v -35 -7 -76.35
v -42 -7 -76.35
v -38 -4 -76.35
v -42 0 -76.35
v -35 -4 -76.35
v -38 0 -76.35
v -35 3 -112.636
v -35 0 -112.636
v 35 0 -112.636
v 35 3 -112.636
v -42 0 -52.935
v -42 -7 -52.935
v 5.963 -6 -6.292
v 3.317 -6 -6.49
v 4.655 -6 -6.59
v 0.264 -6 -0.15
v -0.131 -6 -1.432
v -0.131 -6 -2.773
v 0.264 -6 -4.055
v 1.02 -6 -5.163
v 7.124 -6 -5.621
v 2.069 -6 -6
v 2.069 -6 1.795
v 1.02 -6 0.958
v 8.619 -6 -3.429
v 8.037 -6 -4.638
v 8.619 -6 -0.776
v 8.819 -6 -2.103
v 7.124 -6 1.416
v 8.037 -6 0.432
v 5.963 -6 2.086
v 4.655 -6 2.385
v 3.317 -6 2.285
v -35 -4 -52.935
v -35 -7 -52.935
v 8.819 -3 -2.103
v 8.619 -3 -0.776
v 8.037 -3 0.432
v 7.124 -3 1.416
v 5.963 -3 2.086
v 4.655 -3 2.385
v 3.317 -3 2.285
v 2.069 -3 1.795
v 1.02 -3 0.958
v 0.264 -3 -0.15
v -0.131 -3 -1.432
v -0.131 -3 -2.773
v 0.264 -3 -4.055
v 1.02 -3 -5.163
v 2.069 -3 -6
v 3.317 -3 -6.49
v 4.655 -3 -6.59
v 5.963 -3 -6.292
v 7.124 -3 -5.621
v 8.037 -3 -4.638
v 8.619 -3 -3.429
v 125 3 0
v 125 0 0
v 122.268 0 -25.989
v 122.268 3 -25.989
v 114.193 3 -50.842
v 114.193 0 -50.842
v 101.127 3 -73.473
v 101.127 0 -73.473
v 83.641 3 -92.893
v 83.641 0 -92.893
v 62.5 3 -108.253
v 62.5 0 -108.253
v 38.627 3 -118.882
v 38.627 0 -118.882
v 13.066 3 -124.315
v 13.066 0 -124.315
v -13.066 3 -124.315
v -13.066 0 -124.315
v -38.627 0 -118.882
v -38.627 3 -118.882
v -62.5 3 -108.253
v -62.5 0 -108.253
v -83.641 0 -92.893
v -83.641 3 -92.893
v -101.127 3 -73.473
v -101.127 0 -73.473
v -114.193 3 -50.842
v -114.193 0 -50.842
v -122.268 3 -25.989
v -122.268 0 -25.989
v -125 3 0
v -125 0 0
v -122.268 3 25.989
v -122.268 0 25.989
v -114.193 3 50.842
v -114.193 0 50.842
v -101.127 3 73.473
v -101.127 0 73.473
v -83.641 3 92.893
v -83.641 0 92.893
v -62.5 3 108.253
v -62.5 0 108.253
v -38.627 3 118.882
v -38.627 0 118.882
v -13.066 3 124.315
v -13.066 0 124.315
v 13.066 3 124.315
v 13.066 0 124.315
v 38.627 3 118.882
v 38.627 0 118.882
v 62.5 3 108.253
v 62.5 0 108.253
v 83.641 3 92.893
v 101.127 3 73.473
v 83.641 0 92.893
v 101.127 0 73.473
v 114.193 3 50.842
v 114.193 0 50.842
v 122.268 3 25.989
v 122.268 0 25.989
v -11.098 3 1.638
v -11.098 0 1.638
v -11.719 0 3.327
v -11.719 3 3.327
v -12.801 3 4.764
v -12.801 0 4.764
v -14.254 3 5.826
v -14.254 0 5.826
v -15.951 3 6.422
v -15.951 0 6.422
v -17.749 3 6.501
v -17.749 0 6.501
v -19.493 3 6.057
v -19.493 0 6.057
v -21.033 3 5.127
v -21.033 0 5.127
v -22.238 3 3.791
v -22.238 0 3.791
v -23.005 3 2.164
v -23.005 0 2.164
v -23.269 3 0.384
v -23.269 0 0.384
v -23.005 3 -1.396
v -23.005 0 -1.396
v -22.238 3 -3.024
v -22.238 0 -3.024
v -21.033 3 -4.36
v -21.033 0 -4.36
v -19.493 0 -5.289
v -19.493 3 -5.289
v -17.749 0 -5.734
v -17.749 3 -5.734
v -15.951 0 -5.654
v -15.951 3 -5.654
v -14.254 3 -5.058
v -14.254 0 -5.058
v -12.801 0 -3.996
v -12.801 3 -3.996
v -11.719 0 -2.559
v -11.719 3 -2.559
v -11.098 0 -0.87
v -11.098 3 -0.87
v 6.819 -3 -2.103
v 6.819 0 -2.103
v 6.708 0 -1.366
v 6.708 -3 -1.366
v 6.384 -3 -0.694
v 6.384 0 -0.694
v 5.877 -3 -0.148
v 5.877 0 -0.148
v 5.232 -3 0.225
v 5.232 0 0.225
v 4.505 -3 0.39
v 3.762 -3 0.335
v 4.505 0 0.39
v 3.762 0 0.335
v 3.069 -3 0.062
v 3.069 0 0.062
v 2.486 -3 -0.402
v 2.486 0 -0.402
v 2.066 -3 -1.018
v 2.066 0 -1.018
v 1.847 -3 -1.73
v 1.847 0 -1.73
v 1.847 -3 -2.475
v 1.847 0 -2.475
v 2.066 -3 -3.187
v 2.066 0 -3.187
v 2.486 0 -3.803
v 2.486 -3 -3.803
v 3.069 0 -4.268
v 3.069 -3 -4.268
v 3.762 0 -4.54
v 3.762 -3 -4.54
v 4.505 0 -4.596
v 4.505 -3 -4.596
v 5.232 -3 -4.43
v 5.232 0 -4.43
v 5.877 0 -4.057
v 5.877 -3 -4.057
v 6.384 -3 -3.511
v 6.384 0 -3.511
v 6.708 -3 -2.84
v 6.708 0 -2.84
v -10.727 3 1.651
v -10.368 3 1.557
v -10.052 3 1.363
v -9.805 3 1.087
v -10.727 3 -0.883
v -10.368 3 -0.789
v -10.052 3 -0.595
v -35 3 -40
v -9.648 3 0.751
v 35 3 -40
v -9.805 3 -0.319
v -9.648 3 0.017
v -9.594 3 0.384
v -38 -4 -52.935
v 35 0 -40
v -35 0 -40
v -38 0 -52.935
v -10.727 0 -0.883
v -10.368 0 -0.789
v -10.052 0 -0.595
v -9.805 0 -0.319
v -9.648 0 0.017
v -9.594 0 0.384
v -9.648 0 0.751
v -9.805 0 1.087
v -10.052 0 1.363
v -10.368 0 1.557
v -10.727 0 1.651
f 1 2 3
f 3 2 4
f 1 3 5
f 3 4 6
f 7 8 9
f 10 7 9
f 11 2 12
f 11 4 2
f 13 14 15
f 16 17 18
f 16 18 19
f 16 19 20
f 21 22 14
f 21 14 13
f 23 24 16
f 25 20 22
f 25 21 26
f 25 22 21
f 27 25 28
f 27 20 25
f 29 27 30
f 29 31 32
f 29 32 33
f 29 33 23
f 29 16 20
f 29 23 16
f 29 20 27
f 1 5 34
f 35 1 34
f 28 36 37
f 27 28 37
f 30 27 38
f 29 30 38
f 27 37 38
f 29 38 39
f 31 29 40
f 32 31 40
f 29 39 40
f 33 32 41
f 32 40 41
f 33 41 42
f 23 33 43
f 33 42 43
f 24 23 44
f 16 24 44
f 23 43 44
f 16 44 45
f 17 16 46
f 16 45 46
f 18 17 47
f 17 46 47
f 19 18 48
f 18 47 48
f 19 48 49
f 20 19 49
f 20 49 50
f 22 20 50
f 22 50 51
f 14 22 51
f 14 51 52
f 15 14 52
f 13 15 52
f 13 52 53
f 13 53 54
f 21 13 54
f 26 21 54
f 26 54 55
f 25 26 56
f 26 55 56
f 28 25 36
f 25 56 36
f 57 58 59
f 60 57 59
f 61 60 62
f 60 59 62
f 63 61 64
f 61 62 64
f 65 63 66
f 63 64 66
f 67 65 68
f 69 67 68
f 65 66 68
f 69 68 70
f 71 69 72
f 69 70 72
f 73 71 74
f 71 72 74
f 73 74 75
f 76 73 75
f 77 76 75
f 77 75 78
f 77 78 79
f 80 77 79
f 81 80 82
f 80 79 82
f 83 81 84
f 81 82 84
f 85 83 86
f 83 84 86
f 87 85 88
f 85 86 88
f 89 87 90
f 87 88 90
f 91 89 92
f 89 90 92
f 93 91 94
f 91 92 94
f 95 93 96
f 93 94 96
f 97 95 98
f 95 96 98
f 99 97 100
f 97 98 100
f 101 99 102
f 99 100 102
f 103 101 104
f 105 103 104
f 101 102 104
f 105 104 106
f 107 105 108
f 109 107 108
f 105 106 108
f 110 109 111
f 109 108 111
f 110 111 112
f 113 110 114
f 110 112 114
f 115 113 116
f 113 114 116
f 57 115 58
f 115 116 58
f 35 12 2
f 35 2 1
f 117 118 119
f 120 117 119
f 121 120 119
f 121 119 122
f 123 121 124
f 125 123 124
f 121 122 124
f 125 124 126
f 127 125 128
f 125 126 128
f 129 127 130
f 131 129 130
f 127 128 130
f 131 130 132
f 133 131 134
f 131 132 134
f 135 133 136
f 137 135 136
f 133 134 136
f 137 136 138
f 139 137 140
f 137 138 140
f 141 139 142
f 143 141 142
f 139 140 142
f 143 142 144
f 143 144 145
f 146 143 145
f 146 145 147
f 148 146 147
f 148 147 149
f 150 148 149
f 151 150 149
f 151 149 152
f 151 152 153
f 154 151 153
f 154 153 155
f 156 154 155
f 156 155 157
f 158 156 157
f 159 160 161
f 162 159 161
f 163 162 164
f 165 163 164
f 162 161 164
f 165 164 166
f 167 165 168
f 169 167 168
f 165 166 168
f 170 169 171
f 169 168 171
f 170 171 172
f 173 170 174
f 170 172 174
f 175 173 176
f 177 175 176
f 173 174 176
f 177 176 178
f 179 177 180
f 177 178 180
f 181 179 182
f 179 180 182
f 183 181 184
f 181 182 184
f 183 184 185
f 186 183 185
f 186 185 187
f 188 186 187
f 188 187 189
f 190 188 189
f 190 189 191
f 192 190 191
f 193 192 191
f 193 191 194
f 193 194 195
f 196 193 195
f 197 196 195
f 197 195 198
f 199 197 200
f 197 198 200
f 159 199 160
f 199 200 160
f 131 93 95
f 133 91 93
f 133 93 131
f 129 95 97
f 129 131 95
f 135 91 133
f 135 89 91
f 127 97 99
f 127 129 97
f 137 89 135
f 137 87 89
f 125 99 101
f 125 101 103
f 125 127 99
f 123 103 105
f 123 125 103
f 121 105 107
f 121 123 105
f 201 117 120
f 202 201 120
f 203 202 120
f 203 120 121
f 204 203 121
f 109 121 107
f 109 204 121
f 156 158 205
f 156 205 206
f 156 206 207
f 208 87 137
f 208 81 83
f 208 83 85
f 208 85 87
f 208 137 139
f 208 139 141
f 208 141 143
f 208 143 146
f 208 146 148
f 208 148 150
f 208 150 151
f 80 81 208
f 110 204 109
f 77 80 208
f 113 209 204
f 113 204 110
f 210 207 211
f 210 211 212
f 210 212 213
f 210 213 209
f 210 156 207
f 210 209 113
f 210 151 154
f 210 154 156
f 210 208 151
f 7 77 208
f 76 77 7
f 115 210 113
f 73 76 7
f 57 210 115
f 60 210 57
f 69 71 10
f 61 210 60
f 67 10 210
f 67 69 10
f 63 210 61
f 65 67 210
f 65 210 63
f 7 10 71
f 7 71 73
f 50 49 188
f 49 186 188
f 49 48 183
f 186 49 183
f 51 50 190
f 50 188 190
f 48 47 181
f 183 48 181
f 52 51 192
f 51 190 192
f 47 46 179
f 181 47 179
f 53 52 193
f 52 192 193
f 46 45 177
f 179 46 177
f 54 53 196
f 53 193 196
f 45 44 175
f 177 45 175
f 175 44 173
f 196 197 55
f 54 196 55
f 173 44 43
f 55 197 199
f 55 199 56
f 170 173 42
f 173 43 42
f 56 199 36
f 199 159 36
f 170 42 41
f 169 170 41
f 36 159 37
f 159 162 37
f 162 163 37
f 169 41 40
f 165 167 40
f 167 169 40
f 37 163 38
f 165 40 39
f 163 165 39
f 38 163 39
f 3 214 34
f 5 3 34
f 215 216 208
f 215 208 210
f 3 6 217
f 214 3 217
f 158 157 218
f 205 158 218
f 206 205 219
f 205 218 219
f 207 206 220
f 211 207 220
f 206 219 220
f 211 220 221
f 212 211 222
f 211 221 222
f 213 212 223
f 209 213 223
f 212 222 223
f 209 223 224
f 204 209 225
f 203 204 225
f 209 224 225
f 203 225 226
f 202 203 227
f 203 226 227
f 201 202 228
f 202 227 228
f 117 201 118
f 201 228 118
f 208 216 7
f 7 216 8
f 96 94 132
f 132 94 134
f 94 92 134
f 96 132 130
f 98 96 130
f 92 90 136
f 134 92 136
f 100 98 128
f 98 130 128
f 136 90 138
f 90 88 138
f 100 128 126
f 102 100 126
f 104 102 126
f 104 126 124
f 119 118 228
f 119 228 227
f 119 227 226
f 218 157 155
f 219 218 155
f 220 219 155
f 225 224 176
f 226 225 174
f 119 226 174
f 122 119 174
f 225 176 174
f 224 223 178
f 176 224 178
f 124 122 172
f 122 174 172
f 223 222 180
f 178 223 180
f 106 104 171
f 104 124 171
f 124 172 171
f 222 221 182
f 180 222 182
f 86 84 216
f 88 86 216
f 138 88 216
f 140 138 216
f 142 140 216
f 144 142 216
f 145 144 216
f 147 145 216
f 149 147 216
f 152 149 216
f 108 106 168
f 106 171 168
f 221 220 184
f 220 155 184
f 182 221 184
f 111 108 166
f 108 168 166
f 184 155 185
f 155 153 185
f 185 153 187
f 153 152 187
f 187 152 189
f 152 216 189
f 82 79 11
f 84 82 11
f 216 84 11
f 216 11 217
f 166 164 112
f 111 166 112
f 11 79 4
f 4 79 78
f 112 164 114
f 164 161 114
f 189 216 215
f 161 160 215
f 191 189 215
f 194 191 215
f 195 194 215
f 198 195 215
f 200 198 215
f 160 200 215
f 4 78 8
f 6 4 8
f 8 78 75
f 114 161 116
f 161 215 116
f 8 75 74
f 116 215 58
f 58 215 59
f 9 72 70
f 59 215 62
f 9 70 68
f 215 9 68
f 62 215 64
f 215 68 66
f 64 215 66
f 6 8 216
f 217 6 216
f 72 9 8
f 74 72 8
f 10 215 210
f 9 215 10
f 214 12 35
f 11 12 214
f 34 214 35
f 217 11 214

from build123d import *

# Parameters (mm, degrees)
IZIM1_R                     = 125
IZIM1_W                     = 70
IZIM1_H                     = 72.635569235
Y_KSEKLIK_EKSTR_ZYON1_DEPTH = 3
IZIM6_W                     = 4
IZIM6_H                     = 23.415137081
Y_KSEKLIK_EKSTR_ZYON3_DEPTH = 4
Y_KSEKLIK_EKSTR_ZYON4_START = 4
IZIM6_3_W                   = 7
IZIM6_3_H                   = 23.415137081
Y_KSEKLIK_EKSTR_ZYON4_DEPTH = 3
IZIM8_R                     = 2.5
Y_KSEKLIK_EKSTR_ZYON5_DEPTH = 3
Y_KSEKLIK_EKSTR_ZYON6_START = 3
IZIM8_4_R                   = 4.5
Y_KSEKLIK_EKSTR_ZYON6_DEPTH = 3
KES_EKSTR_ZYON1_DEPTH       = 4


with BuildPart() as part:
    # Çizim1 → Yükseklik-Ekstrüzyon1 (new body)
    with BuildSketch(Plane(origin=(0, 0, 0), x_dir=(1, 0, 0), z_dir=(0, 1, 0))):
        Circle(IZIM1_R)
        with Locations((0, 76.317784617)):
            Rectangle(IZIM1_W, IZIM1_H, mode=Mode.SUBTRACT)
    extrude(amount=Y_KSEKLIK_EKSTR_ZYON1_DEPTH)

    # Çizim6 → Yükseklik-Ekstrüzyon3 (add)
    with BuildSketch(Plane.XZ):
        with Locations((-40, -64.642786203)):
            Rectangle(IZIM6_W, IZIM6_H)
    extrude(amount=Y_KSEKLIK_EKSTR_ZYON3_DEPTH)

    # Çizim6<3> → Yükseklik-Ekstrüzyon4 (add)
    with BuildSketch(Plane.XZ.offset(Y_KSEKLIK_EKSTR_ZYON4_START)):
        with Locations((-38.5, -64.642786203)):
            Rectangle(IZIM6_3_W, IZIM6_3_H)
    extrude(amount=Y_KSEKLIK_EKSTR_ZYON4_DEPTH)

    # Çizim8 → Yükseklik-Ekstrüzyon5 (add)
    with BuildSketch(Plane.XZ):
        with Locations((4.318604625, -2.102613205)):
            Circle(IZIM8_R)
    extrude(amount=Y_KSEKLIK_EKSTR_ZYON5_DEPTH)

    # Çizim8<4> → Yükseklik-Ekstrüzyon6 (add)
    with BuildSketch(Plane.XZ.offset(Y_KSEKLIK_EKSTR_ZYON6_START)):
        with Locations((4.318604625, -2.102613205)):
            Circle(IZIM8_4_R)
    extrude(amount=Y_KSEKLIK_EKSTR_ZYON6_DEPTH)

    # Çizim10 → Kes-Ekstrüzyon1 (cut, through all)
    with BuildSketch(Plane.XZ):
        with BuildLine():
            ThreePointArc((-11.097827728, 1.63805679), (-23.268577728, 0.38383614), (-11.097827728, -0.870384509))
            ThreePointArc((-11.097827728, -0.870384509), (-9.593577728, 0.38383614), (-11.097827728, 1.63805679))
        make_face()
    extrude(amount=-KES_EKSTR_ZYON1_DEPTH, mode=Mode.SUBTRACT)


solid = part.part
